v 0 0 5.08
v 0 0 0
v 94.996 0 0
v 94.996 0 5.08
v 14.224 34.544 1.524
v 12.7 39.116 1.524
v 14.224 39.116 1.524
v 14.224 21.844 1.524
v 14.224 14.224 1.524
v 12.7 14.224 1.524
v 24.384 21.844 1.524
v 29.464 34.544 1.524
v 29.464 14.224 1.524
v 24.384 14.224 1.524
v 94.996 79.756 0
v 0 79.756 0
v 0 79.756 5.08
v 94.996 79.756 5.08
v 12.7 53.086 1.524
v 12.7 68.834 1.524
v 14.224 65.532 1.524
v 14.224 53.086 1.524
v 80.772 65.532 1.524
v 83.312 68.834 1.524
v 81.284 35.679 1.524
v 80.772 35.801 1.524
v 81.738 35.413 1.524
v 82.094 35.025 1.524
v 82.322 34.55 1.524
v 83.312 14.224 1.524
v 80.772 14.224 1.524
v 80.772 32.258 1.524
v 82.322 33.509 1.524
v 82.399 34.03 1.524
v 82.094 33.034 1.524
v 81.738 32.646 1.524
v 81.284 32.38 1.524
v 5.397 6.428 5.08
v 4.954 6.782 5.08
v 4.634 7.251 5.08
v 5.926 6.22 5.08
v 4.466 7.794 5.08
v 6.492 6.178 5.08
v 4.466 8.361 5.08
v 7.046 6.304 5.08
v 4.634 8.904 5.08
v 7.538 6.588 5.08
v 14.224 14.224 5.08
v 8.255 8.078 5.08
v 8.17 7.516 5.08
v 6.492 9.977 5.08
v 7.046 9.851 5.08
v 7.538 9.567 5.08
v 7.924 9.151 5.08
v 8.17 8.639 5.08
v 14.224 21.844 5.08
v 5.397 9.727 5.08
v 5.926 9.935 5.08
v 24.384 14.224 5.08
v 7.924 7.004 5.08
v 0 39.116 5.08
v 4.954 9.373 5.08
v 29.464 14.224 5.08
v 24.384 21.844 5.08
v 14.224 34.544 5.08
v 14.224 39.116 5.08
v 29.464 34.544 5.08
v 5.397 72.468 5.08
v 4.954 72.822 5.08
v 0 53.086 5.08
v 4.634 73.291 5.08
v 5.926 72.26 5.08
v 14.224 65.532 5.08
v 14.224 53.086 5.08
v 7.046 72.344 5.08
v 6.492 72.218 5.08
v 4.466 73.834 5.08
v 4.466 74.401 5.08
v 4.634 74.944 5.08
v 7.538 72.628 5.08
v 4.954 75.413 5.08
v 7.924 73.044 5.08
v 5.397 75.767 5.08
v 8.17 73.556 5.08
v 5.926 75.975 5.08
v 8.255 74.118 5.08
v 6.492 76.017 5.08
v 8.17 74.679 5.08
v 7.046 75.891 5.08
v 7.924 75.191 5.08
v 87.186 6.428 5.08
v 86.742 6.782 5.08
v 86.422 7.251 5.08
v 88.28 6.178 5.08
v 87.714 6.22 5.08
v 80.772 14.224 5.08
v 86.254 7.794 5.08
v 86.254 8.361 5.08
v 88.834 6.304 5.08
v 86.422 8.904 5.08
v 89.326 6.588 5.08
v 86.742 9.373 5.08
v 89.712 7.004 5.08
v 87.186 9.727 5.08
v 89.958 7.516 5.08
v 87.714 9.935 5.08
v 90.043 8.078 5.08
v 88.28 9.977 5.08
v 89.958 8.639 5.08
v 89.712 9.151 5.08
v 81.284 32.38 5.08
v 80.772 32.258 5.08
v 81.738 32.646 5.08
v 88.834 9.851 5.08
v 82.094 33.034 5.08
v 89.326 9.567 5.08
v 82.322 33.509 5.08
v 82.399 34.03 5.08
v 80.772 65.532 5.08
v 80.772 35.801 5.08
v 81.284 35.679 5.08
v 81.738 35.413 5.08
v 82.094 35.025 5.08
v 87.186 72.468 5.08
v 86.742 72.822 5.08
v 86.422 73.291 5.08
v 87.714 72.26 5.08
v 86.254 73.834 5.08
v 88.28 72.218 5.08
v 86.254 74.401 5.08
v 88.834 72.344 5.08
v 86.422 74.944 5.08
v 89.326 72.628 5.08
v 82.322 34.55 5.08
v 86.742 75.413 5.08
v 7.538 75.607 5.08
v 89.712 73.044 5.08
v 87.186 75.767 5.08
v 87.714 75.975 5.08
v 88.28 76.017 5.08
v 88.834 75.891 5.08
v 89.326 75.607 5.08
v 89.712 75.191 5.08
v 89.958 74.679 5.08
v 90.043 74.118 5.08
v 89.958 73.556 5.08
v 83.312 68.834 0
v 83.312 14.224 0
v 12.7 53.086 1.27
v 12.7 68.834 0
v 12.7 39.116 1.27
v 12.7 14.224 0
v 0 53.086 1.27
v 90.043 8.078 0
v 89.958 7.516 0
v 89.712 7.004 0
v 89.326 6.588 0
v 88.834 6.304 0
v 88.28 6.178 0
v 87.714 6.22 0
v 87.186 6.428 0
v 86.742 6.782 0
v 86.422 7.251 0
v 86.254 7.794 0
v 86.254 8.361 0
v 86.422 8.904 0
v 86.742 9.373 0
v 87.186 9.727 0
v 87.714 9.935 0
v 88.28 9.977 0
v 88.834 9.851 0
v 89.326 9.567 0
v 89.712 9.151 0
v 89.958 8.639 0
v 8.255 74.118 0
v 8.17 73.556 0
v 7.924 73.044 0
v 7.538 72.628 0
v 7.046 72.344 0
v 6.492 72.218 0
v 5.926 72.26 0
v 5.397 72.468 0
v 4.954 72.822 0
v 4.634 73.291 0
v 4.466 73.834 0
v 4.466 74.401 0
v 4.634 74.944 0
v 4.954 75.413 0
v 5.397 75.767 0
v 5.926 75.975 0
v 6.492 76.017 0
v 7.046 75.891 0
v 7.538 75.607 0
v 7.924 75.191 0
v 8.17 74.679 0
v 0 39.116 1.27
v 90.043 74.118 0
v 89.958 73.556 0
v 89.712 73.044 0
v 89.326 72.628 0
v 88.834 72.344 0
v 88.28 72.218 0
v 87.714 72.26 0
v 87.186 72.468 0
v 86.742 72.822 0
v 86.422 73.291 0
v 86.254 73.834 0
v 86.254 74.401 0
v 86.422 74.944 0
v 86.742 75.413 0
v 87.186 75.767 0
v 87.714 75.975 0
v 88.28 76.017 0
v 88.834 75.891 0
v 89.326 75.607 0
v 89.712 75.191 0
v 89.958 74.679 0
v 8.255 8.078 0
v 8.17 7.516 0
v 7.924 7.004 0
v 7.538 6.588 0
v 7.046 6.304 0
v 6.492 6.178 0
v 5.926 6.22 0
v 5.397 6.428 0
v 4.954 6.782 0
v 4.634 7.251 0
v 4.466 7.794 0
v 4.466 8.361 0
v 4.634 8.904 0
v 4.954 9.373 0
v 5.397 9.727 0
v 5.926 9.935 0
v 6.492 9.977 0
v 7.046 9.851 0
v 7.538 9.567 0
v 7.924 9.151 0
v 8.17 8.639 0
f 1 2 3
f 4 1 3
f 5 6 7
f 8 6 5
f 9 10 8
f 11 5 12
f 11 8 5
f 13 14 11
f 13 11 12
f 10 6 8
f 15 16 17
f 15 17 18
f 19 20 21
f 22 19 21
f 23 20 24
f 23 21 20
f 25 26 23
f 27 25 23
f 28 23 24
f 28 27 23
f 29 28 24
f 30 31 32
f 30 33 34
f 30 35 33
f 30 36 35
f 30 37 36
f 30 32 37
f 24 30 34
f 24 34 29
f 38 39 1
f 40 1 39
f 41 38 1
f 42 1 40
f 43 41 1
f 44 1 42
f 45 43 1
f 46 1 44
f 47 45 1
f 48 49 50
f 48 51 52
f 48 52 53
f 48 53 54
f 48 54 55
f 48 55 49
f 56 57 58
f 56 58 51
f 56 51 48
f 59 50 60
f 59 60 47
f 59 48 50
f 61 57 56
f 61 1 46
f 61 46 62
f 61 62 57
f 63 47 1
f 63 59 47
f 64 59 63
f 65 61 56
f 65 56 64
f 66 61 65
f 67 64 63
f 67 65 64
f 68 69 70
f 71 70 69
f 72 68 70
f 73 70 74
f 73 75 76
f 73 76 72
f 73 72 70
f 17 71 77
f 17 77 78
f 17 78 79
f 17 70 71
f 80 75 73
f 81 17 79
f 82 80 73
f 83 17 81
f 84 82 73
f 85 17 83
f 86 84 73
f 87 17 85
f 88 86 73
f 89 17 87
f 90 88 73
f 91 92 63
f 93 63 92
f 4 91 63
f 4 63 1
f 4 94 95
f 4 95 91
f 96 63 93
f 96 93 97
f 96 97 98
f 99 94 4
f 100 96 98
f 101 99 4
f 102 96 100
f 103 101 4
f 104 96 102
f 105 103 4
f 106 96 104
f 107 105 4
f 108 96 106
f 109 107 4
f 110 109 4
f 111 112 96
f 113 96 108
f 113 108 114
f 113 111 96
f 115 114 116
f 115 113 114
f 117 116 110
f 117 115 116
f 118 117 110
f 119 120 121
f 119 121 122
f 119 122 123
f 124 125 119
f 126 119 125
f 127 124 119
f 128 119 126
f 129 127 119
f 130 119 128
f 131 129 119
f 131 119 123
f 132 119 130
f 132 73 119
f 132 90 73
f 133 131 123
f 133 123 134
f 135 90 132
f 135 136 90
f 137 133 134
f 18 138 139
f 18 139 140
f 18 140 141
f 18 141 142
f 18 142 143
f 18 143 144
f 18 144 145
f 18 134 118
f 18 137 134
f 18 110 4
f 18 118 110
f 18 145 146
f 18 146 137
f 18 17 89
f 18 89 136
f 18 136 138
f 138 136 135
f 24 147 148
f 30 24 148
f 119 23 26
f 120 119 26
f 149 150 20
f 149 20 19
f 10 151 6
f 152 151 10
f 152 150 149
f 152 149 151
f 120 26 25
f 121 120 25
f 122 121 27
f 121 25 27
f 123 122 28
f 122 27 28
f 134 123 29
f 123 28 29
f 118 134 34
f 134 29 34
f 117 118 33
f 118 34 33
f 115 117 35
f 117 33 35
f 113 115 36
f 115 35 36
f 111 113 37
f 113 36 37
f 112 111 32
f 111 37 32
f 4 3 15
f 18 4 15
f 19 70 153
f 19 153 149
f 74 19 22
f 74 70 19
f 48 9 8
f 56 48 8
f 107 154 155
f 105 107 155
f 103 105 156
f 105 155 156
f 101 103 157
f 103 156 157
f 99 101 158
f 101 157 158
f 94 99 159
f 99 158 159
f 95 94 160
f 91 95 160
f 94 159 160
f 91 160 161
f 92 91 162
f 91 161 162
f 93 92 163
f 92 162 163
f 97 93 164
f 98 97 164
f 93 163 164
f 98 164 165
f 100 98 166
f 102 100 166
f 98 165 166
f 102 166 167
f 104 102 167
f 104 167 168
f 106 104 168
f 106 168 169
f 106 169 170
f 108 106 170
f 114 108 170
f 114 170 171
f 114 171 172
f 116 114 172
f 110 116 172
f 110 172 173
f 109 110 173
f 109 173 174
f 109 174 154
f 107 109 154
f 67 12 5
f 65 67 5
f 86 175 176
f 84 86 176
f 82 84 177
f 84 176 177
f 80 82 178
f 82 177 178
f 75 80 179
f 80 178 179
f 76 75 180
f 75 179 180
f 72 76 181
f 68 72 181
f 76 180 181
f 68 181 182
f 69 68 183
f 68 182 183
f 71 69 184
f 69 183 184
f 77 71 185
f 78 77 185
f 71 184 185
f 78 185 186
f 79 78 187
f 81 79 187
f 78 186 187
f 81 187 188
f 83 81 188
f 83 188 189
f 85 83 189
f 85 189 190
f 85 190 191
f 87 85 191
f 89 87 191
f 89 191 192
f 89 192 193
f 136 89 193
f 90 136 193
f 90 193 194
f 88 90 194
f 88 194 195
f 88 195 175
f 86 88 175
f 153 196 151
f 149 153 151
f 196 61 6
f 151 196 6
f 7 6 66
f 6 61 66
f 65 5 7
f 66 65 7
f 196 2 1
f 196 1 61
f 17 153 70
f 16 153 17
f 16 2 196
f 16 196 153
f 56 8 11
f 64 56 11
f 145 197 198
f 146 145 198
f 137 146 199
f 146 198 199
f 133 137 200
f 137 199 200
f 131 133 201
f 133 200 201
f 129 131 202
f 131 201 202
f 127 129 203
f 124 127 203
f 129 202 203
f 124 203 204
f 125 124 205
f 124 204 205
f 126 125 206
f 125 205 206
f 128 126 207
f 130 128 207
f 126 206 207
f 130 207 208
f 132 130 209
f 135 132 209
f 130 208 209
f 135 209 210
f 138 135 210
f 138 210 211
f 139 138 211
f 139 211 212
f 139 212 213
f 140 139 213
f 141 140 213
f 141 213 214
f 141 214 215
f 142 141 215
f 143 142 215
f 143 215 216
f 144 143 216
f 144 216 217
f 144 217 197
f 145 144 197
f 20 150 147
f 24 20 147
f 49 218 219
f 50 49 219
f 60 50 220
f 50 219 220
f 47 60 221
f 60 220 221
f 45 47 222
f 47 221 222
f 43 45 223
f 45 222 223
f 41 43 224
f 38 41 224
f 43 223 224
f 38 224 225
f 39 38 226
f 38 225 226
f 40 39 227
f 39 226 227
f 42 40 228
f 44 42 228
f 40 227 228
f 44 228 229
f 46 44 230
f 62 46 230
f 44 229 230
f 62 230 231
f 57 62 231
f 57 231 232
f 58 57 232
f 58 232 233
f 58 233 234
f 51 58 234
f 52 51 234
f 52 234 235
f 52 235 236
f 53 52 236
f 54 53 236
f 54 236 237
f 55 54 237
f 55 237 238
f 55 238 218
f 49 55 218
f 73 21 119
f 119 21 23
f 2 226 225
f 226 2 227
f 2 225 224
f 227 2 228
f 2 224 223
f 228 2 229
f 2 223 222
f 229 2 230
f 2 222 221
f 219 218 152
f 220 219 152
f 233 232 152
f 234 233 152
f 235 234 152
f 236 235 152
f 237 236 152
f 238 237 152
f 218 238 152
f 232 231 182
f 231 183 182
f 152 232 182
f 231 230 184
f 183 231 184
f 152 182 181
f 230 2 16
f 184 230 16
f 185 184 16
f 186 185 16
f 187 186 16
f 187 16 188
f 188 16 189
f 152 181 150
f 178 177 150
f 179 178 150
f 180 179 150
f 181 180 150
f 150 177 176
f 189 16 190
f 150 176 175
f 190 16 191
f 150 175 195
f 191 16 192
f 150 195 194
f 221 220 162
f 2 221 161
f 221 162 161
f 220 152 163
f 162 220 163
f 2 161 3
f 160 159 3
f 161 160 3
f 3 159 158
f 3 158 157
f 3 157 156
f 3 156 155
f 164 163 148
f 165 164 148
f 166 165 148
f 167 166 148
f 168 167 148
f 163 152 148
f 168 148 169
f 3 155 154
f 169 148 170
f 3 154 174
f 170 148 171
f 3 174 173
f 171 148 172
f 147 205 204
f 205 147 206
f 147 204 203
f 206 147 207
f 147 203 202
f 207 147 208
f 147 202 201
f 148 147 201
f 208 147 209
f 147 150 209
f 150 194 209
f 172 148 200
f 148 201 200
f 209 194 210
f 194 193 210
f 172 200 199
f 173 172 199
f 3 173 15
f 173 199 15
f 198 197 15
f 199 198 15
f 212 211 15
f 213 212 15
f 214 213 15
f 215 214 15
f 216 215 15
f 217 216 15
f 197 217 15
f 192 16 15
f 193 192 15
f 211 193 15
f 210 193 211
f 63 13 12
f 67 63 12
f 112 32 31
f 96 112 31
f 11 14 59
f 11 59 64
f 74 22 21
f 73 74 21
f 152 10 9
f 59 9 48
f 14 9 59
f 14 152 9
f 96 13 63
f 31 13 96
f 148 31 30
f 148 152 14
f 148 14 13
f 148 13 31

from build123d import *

# Parameters (mm, degrees)
F0_W     = 94.996
F0_H     = 79.756
F0_W_2   = 10.16
F0_H_2   = 7.62
F1_DEPTH = 5.08
F2_W     = 70.612
F2_H     = 54.61
F3_DEPTH = 1.524
F5_DEPTH = 25.4
F6_R     = 1.905
F7_DEPTH = 25.4
F8_W     = 24.773464
F8_H     = 13.97
F9_DEPTH = 3.81


with BuildPart() as f1:
    # F0 (on Top) → F1 (new body)
    with BuildSketch(Plane.XY):
        with Locations((47.498, 39.878)):
            Rectangle(F0_W, F0_H)
        with Locations((19.304, 18.034)):
            Rectangle(F0_W_2, F0_H_2, mode=Mode.SUBTRACT)
        Polygon((14.224, 65.532), (80.772, 65.532), (80.772, 14.224), (29.464, 14.224), (29.464, 34.544), (14.224, 34.544), align=None, mode=Mode.SUBTRACT)
    extrude(amount=F1_DEPTH)

    # F2 (on face) → F3 (cut)
    with BuildSketch(Plane(origin=(0, 0, 0), x_dir=(1, 0, 0), z_dir=(0, 0, -1))):
        with Locations((48.006, -41.529)):
            Rectangle(F2_W, F2_H)
    extrude(amount=-F3_DEPTH, mode=Mode.SUBTRACT)

    # F4 (on face) → F5 (cut)
    with BuildSketch(Plane(origin=(0, 0, 1.524), x_dir=(1, 0, 0), z_dir=(0, 0, -1))):
        with BuildLine():
            Line((80.772, -32.258), (80.772, -35.80123))
            ThreePointArc((80.772, -35.80123), (82.399452, -34.029615), (80.772, -32.258))
        make_face()
    extrude(amount=-F5_DEPTH, mode=Mode.SUBTRACT)

    # F6 (on face) → F7 (cut)
    with BuildSketch(Plane(origin=(0, 0, 0), x_dir=(1, 0, 0), z_dir=(0, 0, -1))):
        with Locations((6.35, -8.077516)):
            Circle(F6_R)
        with Locations((88.138, -8.077516)):
            Circle(F6_R)
        with Locations((6.35, -74.117516)):
            Circle(F6_R)
        with Locations((88.138, -74.117516)):
            Circle(F6_R)
    extrude(amount=-F7_DEPTH, mode=Mode.SUBTRACT)

    # F8 (on face) → F9 (cut)
    with BuildSketch(Plane.XY.offset(5.08)):
        with Locations((8.389047, 46.101)):
            Rectangle(F8_W, F8_H)
    extrude(amount=-F9_DEPTH, mode=Mode.SUBTRACT)


solid = f1.part
